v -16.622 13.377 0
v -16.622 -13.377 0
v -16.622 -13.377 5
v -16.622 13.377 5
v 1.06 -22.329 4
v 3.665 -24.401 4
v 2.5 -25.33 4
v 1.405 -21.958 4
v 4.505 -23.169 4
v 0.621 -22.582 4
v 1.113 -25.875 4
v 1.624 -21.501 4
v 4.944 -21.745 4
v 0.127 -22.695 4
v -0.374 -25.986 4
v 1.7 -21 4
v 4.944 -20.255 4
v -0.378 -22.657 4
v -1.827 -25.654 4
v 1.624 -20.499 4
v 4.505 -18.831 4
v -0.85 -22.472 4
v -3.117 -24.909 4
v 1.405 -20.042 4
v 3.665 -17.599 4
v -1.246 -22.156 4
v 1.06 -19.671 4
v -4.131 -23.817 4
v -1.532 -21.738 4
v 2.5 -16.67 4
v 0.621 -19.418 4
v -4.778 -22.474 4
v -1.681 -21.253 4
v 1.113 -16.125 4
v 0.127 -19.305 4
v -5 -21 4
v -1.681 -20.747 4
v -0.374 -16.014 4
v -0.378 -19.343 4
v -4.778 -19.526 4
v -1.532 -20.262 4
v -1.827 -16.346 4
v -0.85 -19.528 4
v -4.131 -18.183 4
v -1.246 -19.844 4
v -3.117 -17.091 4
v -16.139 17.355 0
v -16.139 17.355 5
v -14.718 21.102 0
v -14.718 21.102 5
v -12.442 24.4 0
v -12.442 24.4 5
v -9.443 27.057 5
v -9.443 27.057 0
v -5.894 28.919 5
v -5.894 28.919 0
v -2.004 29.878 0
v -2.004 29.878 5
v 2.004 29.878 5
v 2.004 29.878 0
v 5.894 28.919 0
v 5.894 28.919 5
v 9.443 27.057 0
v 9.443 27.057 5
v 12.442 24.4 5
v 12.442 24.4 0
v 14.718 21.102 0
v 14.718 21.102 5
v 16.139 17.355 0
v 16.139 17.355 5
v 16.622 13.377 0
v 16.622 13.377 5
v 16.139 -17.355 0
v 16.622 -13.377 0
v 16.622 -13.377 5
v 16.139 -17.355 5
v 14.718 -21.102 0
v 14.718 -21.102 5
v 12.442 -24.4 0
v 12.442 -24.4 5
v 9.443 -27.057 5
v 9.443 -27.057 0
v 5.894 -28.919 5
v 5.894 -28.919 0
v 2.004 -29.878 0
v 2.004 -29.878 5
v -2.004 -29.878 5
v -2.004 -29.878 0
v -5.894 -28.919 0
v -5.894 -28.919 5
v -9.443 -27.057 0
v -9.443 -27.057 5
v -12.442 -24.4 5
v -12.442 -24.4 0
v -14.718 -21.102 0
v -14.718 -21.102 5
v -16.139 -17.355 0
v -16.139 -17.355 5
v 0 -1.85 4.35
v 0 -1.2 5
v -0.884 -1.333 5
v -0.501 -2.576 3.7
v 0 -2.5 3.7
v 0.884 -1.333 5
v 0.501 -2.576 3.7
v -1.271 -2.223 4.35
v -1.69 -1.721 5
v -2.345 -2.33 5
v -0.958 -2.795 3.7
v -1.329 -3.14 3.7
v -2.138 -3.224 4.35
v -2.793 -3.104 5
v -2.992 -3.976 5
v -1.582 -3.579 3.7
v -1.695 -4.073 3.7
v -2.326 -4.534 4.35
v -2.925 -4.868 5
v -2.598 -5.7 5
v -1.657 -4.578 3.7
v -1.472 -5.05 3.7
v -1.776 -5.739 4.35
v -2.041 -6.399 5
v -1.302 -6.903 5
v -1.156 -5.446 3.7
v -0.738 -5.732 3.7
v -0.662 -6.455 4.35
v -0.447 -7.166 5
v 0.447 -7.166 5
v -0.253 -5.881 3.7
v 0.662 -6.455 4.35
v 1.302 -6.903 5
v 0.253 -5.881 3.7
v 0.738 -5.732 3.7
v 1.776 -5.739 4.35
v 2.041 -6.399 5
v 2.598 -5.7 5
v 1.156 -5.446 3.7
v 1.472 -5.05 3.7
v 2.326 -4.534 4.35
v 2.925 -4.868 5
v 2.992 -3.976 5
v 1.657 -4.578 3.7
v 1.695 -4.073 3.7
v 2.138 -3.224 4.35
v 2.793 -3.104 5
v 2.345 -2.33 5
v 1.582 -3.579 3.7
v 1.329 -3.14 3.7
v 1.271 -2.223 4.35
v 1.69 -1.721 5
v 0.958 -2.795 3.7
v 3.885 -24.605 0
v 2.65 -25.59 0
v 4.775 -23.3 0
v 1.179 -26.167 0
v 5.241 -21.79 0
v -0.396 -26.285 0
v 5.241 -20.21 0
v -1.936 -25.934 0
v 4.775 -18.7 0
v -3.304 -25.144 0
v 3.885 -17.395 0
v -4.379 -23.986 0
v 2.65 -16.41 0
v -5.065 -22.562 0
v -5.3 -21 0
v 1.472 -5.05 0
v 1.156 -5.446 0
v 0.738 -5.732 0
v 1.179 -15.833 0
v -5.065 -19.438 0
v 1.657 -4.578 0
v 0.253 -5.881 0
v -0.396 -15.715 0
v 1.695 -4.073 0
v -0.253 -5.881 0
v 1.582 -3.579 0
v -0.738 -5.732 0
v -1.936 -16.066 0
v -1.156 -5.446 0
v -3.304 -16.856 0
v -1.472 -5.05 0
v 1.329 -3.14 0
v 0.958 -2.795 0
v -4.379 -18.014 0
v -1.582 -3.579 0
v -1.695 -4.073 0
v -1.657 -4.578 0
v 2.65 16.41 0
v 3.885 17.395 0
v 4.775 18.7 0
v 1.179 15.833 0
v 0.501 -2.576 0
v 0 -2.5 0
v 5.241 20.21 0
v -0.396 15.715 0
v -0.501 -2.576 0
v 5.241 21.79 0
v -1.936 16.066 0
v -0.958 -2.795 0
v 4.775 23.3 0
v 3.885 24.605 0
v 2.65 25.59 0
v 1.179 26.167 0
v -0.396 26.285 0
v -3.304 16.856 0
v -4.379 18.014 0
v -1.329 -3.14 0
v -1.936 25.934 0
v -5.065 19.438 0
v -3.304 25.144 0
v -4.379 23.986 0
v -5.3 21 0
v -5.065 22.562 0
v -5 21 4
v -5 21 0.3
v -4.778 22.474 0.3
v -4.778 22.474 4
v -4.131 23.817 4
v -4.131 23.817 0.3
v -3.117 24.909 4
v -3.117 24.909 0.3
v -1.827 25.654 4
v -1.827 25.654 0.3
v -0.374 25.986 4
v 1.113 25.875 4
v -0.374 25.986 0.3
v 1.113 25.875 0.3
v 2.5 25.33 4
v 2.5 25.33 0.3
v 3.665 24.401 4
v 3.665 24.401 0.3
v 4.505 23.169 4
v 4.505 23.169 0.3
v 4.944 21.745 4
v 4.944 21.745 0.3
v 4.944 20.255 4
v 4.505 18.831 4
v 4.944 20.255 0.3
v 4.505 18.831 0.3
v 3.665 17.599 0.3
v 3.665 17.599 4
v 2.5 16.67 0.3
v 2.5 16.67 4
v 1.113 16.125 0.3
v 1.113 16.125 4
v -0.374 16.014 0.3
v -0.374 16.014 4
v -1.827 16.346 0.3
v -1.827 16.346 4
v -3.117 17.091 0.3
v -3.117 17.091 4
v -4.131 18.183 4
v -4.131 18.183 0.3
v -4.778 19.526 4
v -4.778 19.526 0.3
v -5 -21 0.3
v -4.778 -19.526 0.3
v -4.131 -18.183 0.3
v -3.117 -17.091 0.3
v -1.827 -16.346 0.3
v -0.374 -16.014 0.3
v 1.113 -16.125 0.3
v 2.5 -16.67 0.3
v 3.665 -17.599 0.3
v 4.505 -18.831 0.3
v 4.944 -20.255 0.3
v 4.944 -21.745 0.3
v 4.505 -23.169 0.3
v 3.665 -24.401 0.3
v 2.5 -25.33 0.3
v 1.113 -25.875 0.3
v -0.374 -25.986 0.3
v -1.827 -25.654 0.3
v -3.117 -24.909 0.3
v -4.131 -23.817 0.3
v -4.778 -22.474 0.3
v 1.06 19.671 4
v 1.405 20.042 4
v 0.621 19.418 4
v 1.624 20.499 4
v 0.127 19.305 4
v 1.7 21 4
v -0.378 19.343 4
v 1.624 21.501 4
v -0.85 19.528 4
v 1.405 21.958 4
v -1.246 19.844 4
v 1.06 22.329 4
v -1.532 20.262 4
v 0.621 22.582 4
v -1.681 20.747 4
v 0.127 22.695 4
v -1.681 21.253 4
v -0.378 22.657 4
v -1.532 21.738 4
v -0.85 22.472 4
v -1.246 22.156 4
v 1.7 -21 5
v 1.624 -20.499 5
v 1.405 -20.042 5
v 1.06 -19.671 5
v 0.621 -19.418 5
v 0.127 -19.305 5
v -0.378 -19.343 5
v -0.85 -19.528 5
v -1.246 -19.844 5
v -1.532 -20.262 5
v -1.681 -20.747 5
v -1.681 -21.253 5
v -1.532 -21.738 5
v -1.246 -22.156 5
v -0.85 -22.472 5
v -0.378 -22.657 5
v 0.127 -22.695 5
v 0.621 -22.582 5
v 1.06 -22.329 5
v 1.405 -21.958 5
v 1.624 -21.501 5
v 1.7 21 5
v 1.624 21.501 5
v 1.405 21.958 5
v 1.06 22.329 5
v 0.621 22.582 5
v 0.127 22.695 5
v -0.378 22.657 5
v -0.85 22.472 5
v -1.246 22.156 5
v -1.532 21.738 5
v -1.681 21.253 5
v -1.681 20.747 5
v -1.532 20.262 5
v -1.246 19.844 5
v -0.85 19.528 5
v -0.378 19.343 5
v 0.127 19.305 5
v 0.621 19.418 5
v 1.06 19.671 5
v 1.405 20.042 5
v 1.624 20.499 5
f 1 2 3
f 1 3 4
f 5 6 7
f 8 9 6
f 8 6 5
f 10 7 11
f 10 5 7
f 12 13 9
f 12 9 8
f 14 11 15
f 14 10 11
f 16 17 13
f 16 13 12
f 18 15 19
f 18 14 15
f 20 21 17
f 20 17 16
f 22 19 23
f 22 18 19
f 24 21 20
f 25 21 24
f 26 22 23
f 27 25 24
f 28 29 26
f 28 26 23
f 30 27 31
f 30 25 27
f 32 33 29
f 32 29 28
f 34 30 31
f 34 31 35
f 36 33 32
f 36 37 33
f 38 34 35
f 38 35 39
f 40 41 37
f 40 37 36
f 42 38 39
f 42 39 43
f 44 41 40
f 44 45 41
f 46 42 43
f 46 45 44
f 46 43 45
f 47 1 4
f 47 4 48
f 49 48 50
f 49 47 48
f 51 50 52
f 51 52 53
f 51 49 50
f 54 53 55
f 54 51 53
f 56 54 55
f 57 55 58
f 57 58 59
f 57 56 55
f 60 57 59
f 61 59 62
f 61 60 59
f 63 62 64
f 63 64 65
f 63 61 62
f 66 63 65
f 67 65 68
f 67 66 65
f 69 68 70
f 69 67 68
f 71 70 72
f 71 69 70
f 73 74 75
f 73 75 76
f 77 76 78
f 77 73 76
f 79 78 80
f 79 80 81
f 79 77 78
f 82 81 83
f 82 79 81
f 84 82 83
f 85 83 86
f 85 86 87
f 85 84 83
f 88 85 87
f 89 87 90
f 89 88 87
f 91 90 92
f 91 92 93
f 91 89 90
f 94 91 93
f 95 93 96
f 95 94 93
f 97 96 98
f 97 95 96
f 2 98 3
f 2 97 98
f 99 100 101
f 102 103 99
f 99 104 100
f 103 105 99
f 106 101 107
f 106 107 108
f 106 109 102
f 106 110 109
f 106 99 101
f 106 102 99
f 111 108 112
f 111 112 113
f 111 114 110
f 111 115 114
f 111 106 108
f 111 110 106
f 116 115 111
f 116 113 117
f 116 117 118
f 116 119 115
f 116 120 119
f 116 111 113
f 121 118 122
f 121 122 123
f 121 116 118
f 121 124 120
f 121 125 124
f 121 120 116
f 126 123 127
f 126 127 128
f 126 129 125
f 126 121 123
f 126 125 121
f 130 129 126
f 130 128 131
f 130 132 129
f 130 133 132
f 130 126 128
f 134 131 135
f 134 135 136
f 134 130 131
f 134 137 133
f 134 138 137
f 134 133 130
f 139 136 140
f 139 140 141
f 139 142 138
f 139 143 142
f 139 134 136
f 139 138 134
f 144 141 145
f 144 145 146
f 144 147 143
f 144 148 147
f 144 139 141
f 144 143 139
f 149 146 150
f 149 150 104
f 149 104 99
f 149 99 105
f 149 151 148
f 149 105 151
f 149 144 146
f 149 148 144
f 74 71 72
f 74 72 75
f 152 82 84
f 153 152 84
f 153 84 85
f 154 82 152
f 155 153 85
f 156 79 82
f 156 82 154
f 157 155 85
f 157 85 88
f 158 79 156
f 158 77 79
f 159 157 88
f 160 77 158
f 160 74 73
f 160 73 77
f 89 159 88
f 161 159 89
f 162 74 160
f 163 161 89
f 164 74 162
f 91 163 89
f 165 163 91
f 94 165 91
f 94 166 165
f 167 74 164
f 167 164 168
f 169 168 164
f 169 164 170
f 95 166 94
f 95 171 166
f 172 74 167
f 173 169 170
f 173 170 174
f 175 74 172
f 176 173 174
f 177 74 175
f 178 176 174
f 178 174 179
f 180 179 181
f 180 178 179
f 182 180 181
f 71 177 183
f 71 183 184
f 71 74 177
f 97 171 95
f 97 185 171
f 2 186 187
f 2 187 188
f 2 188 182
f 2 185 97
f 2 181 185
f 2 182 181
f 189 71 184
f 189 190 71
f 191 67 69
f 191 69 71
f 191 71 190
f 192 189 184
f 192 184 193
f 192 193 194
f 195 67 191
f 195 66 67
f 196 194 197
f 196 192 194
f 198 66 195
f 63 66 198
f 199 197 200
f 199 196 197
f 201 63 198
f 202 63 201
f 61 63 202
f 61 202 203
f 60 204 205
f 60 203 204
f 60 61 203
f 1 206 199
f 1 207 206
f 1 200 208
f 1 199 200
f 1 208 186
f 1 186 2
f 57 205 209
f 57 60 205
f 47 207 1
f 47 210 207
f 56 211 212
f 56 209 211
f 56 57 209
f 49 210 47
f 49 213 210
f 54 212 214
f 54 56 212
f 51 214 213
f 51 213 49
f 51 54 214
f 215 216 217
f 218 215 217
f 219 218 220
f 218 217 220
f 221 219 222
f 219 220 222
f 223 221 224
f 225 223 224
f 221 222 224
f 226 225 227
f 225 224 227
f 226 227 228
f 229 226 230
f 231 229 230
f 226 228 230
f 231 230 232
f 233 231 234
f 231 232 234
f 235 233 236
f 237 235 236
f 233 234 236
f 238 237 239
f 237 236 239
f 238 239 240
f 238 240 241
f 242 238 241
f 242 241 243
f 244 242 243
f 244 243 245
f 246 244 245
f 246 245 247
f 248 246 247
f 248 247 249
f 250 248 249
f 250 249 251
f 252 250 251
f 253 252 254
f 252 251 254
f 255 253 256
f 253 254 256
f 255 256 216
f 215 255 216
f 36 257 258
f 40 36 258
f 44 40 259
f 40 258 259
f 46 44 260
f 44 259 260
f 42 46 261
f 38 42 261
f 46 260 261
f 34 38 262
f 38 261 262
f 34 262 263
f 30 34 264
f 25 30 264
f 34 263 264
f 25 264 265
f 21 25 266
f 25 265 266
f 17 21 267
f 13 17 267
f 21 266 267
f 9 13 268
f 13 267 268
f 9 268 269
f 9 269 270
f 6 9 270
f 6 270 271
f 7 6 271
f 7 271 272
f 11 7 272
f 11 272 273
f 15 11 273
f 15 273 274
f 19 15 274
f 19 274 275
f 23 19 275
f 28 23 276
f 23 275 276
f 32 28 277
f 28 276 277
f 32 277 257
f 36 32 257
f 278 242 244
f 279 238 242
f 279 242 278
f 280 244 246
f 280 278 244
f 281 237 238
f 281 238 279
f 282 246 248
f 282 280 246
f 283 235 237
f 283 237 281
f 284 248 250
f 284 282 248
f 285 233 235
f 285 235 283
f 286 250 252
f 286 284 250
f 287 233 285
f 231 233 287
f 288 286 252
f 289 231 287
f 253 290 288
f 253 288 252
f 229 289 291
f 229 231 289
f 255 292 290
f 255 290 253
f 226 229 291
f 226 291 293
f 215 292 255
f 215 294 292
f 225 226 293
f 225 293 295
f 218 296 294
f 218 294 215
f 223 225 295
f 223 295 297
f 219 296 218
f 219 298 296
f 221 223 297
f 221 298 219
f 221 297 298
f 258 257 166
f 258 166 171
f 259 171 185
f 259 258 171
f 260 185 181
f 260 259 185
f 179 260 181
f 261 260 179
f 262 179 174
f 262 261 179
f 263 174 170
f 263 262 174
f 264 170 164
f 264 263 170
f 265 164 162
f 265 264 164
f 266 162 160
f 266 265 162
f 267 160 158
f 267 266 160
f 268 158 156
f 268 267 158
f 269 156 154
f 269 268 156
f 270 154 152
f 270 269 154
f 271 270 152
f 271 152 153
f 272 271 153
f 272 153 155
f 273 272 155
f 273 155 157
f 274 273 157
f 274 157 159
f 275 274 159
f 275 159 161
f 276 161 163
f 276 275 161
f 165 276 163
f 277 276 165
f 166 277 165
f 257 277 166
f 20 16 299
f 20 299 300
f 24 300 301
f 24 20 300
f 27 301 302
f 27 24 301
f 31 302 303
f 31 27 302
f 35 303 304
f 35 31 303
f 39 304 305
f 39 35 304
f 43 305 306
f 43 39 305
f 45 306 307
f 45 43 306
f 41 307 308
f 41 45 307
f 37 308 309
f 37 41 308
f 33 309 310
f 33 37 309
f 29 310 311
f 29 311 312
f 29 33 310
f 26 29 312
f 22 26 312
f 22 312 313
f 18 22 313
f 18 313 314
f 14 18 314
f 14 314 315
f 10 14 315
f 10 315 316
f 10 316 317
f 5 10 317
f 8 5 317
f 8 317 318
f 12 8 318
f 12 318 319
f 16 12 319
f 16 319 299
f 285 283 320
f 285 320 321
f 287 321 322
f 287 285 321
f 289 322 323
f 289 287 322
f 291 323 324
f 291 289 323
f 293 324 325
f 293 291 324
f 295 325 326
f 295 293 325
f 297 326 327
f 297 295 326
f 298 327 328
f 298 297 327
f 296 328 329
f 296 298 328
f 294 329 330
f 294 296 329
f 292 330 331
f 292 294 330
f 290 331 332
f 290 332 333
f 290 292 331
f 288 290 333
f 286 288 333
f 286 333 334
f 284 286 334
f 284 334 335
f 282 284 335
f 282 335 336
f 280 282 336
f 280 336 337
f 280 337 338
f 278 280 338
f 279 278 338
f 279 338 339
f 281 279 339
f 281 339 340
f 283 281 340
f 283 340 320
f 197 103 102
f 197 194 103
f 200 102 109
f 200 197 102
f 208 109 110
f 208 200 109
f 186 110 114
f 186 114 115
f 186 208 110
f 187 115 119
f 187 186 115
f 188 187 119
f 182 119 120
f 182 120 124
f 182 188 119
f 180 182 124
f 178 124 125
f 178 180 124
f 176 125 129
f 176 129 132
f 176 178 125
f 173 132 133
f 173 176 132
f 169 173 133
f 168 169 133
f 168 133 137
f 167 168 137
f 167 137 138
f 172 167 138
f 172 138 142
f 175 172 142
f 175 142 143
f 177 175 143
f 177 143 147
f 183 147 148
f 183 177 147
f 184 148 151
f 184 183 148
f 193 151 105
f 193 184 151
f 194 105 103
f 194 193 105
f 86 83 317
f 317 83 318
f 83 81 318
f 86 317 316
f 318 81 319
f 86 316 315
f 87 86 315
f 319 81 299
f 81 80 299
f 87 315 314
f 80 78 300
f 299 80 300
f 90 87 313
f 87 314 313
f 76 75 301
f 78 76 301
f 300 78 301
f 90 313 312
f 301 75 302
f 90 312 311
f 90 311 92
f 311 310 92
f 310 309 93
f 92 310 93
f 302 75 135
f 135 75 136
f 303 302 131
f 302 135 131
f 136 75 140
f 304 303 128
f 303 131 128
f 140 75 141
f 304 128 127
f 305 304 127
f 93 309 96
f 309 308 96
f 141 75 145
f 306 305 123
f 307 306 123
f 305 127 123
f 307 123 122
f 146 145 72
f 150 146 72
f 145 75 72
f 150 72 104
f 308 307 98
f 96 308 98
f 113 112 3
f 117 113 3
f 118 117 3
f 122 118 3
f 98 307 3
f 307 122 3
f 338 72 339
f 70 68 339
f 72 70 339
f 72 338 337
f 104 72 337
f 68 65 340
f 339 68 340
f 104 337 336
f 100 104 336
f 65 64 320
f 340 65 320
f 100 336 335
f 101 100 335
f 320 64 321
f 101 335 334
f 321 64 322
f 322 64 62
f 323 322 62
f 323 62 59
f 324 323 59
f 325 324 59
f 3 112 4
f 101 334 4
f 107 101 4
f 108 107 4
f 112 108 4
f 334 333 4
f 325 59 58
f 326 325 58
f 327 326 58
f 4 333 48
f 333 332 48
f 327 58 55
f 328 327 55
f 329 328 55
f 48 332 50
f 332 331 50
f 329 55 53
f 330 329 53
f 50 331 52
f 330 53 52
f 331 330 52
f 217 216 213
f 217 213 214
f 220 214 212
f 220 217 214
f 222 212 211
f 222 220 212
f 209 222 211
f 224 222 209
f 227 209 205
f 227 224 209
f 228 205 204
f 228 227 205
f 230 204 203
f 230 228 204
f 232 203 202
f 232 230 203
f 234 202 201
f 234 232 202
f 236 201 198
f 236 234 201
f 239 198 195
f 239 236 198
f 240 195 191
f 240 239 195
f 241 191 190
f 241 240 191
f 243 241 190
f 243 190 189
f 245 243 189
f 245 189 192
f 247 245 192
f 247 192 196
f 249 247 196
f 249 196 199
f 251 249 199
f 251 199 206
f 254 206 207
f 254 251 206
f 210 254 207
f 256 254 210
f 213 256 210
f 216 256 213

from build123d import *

# Parameters (mm, degrees)
SKETCH1_R           = 1.7
BOSS_EXTRUDE1_DEPTH = 5
SKETCH3_R           = 5
CUT_EXTRUDE1_DEPTH  = 4
CHAMFER1_SIZE       = 0.3


with BuildPart() as part:
    # Sketch1 → Boss-Extrude1 (new body)
    with BuildSketch(Plane.XY):
        with BuildLine():
            Line((-16.6225, -13.377), (-16.6225, 13.377))
            ThreePointArc((-16.6225, 13.377), (0, 29.9995), (16.6225, 13.377))
            Line((16.6225, 13.377), (16.6225, -13.377))
            ThreePointArc((16.6225, -13.377), (0, -29.9995), (-16.6225, -13.377))
        make_face()
        with Locations((0, -21)):
            Circle(SKETCH1_R, mode=Mode.SUBTRACT)
        with Locations((0, 21)):
            Circle(SKETCH1_R, mode=Mode.SUBTRACT)
    extrude(amount=BOSS_EXTRUDE1_DEPTH)

    # Sketch2 → Cut-Revolve1 (revolve, cut)
    with BuildSketch(Plane(origin=(0, 0, 0), x_dir=(0, 0, -1), z_dir=(1, 0, 0)), mode=Mode.PRIVATE) as cut_revolve1_sk:
        Polygon((0, -4.2), (-5, -4.2), (-5, -7.2), (-3.7, -5.9), (0, -5.9), align=None)
    revolve(cut_revolve1_sk.sketch.rotate(Axis((0, -4.2, 2.5), (0, 0, 1)), 180), axis=Axis((0, -4.2, 2.5), (0, 0, 1)), mode=Mode.SUBTRACT)

    # Sketch3 → Cut-Extrude1 (cut)
    with BuildSketch(Plane(origin=(0, 0, 0), x_dir=(-1, 0, 0), z_dir=(0, 0, -1))):
        with Locations((0, 21)):
            Circle(SKETCH3_R)
        with Locations((0, -21)):
            Circle(SKETCH3_R)
    extrude(amount=-CUT_EXTRUDE1_DEPTH, mode=Mode.SUBTRACT)

    # Chamfer1
    chamfer1_edges = [part.edges().sort_by_distance(p)[0] for p in [
        (5, 21, 0),
        (5, -21, 0),
    ]]
    chamfer(chamfer1_edges, length=CHAMFER1_SIZE)


solid = part.part
